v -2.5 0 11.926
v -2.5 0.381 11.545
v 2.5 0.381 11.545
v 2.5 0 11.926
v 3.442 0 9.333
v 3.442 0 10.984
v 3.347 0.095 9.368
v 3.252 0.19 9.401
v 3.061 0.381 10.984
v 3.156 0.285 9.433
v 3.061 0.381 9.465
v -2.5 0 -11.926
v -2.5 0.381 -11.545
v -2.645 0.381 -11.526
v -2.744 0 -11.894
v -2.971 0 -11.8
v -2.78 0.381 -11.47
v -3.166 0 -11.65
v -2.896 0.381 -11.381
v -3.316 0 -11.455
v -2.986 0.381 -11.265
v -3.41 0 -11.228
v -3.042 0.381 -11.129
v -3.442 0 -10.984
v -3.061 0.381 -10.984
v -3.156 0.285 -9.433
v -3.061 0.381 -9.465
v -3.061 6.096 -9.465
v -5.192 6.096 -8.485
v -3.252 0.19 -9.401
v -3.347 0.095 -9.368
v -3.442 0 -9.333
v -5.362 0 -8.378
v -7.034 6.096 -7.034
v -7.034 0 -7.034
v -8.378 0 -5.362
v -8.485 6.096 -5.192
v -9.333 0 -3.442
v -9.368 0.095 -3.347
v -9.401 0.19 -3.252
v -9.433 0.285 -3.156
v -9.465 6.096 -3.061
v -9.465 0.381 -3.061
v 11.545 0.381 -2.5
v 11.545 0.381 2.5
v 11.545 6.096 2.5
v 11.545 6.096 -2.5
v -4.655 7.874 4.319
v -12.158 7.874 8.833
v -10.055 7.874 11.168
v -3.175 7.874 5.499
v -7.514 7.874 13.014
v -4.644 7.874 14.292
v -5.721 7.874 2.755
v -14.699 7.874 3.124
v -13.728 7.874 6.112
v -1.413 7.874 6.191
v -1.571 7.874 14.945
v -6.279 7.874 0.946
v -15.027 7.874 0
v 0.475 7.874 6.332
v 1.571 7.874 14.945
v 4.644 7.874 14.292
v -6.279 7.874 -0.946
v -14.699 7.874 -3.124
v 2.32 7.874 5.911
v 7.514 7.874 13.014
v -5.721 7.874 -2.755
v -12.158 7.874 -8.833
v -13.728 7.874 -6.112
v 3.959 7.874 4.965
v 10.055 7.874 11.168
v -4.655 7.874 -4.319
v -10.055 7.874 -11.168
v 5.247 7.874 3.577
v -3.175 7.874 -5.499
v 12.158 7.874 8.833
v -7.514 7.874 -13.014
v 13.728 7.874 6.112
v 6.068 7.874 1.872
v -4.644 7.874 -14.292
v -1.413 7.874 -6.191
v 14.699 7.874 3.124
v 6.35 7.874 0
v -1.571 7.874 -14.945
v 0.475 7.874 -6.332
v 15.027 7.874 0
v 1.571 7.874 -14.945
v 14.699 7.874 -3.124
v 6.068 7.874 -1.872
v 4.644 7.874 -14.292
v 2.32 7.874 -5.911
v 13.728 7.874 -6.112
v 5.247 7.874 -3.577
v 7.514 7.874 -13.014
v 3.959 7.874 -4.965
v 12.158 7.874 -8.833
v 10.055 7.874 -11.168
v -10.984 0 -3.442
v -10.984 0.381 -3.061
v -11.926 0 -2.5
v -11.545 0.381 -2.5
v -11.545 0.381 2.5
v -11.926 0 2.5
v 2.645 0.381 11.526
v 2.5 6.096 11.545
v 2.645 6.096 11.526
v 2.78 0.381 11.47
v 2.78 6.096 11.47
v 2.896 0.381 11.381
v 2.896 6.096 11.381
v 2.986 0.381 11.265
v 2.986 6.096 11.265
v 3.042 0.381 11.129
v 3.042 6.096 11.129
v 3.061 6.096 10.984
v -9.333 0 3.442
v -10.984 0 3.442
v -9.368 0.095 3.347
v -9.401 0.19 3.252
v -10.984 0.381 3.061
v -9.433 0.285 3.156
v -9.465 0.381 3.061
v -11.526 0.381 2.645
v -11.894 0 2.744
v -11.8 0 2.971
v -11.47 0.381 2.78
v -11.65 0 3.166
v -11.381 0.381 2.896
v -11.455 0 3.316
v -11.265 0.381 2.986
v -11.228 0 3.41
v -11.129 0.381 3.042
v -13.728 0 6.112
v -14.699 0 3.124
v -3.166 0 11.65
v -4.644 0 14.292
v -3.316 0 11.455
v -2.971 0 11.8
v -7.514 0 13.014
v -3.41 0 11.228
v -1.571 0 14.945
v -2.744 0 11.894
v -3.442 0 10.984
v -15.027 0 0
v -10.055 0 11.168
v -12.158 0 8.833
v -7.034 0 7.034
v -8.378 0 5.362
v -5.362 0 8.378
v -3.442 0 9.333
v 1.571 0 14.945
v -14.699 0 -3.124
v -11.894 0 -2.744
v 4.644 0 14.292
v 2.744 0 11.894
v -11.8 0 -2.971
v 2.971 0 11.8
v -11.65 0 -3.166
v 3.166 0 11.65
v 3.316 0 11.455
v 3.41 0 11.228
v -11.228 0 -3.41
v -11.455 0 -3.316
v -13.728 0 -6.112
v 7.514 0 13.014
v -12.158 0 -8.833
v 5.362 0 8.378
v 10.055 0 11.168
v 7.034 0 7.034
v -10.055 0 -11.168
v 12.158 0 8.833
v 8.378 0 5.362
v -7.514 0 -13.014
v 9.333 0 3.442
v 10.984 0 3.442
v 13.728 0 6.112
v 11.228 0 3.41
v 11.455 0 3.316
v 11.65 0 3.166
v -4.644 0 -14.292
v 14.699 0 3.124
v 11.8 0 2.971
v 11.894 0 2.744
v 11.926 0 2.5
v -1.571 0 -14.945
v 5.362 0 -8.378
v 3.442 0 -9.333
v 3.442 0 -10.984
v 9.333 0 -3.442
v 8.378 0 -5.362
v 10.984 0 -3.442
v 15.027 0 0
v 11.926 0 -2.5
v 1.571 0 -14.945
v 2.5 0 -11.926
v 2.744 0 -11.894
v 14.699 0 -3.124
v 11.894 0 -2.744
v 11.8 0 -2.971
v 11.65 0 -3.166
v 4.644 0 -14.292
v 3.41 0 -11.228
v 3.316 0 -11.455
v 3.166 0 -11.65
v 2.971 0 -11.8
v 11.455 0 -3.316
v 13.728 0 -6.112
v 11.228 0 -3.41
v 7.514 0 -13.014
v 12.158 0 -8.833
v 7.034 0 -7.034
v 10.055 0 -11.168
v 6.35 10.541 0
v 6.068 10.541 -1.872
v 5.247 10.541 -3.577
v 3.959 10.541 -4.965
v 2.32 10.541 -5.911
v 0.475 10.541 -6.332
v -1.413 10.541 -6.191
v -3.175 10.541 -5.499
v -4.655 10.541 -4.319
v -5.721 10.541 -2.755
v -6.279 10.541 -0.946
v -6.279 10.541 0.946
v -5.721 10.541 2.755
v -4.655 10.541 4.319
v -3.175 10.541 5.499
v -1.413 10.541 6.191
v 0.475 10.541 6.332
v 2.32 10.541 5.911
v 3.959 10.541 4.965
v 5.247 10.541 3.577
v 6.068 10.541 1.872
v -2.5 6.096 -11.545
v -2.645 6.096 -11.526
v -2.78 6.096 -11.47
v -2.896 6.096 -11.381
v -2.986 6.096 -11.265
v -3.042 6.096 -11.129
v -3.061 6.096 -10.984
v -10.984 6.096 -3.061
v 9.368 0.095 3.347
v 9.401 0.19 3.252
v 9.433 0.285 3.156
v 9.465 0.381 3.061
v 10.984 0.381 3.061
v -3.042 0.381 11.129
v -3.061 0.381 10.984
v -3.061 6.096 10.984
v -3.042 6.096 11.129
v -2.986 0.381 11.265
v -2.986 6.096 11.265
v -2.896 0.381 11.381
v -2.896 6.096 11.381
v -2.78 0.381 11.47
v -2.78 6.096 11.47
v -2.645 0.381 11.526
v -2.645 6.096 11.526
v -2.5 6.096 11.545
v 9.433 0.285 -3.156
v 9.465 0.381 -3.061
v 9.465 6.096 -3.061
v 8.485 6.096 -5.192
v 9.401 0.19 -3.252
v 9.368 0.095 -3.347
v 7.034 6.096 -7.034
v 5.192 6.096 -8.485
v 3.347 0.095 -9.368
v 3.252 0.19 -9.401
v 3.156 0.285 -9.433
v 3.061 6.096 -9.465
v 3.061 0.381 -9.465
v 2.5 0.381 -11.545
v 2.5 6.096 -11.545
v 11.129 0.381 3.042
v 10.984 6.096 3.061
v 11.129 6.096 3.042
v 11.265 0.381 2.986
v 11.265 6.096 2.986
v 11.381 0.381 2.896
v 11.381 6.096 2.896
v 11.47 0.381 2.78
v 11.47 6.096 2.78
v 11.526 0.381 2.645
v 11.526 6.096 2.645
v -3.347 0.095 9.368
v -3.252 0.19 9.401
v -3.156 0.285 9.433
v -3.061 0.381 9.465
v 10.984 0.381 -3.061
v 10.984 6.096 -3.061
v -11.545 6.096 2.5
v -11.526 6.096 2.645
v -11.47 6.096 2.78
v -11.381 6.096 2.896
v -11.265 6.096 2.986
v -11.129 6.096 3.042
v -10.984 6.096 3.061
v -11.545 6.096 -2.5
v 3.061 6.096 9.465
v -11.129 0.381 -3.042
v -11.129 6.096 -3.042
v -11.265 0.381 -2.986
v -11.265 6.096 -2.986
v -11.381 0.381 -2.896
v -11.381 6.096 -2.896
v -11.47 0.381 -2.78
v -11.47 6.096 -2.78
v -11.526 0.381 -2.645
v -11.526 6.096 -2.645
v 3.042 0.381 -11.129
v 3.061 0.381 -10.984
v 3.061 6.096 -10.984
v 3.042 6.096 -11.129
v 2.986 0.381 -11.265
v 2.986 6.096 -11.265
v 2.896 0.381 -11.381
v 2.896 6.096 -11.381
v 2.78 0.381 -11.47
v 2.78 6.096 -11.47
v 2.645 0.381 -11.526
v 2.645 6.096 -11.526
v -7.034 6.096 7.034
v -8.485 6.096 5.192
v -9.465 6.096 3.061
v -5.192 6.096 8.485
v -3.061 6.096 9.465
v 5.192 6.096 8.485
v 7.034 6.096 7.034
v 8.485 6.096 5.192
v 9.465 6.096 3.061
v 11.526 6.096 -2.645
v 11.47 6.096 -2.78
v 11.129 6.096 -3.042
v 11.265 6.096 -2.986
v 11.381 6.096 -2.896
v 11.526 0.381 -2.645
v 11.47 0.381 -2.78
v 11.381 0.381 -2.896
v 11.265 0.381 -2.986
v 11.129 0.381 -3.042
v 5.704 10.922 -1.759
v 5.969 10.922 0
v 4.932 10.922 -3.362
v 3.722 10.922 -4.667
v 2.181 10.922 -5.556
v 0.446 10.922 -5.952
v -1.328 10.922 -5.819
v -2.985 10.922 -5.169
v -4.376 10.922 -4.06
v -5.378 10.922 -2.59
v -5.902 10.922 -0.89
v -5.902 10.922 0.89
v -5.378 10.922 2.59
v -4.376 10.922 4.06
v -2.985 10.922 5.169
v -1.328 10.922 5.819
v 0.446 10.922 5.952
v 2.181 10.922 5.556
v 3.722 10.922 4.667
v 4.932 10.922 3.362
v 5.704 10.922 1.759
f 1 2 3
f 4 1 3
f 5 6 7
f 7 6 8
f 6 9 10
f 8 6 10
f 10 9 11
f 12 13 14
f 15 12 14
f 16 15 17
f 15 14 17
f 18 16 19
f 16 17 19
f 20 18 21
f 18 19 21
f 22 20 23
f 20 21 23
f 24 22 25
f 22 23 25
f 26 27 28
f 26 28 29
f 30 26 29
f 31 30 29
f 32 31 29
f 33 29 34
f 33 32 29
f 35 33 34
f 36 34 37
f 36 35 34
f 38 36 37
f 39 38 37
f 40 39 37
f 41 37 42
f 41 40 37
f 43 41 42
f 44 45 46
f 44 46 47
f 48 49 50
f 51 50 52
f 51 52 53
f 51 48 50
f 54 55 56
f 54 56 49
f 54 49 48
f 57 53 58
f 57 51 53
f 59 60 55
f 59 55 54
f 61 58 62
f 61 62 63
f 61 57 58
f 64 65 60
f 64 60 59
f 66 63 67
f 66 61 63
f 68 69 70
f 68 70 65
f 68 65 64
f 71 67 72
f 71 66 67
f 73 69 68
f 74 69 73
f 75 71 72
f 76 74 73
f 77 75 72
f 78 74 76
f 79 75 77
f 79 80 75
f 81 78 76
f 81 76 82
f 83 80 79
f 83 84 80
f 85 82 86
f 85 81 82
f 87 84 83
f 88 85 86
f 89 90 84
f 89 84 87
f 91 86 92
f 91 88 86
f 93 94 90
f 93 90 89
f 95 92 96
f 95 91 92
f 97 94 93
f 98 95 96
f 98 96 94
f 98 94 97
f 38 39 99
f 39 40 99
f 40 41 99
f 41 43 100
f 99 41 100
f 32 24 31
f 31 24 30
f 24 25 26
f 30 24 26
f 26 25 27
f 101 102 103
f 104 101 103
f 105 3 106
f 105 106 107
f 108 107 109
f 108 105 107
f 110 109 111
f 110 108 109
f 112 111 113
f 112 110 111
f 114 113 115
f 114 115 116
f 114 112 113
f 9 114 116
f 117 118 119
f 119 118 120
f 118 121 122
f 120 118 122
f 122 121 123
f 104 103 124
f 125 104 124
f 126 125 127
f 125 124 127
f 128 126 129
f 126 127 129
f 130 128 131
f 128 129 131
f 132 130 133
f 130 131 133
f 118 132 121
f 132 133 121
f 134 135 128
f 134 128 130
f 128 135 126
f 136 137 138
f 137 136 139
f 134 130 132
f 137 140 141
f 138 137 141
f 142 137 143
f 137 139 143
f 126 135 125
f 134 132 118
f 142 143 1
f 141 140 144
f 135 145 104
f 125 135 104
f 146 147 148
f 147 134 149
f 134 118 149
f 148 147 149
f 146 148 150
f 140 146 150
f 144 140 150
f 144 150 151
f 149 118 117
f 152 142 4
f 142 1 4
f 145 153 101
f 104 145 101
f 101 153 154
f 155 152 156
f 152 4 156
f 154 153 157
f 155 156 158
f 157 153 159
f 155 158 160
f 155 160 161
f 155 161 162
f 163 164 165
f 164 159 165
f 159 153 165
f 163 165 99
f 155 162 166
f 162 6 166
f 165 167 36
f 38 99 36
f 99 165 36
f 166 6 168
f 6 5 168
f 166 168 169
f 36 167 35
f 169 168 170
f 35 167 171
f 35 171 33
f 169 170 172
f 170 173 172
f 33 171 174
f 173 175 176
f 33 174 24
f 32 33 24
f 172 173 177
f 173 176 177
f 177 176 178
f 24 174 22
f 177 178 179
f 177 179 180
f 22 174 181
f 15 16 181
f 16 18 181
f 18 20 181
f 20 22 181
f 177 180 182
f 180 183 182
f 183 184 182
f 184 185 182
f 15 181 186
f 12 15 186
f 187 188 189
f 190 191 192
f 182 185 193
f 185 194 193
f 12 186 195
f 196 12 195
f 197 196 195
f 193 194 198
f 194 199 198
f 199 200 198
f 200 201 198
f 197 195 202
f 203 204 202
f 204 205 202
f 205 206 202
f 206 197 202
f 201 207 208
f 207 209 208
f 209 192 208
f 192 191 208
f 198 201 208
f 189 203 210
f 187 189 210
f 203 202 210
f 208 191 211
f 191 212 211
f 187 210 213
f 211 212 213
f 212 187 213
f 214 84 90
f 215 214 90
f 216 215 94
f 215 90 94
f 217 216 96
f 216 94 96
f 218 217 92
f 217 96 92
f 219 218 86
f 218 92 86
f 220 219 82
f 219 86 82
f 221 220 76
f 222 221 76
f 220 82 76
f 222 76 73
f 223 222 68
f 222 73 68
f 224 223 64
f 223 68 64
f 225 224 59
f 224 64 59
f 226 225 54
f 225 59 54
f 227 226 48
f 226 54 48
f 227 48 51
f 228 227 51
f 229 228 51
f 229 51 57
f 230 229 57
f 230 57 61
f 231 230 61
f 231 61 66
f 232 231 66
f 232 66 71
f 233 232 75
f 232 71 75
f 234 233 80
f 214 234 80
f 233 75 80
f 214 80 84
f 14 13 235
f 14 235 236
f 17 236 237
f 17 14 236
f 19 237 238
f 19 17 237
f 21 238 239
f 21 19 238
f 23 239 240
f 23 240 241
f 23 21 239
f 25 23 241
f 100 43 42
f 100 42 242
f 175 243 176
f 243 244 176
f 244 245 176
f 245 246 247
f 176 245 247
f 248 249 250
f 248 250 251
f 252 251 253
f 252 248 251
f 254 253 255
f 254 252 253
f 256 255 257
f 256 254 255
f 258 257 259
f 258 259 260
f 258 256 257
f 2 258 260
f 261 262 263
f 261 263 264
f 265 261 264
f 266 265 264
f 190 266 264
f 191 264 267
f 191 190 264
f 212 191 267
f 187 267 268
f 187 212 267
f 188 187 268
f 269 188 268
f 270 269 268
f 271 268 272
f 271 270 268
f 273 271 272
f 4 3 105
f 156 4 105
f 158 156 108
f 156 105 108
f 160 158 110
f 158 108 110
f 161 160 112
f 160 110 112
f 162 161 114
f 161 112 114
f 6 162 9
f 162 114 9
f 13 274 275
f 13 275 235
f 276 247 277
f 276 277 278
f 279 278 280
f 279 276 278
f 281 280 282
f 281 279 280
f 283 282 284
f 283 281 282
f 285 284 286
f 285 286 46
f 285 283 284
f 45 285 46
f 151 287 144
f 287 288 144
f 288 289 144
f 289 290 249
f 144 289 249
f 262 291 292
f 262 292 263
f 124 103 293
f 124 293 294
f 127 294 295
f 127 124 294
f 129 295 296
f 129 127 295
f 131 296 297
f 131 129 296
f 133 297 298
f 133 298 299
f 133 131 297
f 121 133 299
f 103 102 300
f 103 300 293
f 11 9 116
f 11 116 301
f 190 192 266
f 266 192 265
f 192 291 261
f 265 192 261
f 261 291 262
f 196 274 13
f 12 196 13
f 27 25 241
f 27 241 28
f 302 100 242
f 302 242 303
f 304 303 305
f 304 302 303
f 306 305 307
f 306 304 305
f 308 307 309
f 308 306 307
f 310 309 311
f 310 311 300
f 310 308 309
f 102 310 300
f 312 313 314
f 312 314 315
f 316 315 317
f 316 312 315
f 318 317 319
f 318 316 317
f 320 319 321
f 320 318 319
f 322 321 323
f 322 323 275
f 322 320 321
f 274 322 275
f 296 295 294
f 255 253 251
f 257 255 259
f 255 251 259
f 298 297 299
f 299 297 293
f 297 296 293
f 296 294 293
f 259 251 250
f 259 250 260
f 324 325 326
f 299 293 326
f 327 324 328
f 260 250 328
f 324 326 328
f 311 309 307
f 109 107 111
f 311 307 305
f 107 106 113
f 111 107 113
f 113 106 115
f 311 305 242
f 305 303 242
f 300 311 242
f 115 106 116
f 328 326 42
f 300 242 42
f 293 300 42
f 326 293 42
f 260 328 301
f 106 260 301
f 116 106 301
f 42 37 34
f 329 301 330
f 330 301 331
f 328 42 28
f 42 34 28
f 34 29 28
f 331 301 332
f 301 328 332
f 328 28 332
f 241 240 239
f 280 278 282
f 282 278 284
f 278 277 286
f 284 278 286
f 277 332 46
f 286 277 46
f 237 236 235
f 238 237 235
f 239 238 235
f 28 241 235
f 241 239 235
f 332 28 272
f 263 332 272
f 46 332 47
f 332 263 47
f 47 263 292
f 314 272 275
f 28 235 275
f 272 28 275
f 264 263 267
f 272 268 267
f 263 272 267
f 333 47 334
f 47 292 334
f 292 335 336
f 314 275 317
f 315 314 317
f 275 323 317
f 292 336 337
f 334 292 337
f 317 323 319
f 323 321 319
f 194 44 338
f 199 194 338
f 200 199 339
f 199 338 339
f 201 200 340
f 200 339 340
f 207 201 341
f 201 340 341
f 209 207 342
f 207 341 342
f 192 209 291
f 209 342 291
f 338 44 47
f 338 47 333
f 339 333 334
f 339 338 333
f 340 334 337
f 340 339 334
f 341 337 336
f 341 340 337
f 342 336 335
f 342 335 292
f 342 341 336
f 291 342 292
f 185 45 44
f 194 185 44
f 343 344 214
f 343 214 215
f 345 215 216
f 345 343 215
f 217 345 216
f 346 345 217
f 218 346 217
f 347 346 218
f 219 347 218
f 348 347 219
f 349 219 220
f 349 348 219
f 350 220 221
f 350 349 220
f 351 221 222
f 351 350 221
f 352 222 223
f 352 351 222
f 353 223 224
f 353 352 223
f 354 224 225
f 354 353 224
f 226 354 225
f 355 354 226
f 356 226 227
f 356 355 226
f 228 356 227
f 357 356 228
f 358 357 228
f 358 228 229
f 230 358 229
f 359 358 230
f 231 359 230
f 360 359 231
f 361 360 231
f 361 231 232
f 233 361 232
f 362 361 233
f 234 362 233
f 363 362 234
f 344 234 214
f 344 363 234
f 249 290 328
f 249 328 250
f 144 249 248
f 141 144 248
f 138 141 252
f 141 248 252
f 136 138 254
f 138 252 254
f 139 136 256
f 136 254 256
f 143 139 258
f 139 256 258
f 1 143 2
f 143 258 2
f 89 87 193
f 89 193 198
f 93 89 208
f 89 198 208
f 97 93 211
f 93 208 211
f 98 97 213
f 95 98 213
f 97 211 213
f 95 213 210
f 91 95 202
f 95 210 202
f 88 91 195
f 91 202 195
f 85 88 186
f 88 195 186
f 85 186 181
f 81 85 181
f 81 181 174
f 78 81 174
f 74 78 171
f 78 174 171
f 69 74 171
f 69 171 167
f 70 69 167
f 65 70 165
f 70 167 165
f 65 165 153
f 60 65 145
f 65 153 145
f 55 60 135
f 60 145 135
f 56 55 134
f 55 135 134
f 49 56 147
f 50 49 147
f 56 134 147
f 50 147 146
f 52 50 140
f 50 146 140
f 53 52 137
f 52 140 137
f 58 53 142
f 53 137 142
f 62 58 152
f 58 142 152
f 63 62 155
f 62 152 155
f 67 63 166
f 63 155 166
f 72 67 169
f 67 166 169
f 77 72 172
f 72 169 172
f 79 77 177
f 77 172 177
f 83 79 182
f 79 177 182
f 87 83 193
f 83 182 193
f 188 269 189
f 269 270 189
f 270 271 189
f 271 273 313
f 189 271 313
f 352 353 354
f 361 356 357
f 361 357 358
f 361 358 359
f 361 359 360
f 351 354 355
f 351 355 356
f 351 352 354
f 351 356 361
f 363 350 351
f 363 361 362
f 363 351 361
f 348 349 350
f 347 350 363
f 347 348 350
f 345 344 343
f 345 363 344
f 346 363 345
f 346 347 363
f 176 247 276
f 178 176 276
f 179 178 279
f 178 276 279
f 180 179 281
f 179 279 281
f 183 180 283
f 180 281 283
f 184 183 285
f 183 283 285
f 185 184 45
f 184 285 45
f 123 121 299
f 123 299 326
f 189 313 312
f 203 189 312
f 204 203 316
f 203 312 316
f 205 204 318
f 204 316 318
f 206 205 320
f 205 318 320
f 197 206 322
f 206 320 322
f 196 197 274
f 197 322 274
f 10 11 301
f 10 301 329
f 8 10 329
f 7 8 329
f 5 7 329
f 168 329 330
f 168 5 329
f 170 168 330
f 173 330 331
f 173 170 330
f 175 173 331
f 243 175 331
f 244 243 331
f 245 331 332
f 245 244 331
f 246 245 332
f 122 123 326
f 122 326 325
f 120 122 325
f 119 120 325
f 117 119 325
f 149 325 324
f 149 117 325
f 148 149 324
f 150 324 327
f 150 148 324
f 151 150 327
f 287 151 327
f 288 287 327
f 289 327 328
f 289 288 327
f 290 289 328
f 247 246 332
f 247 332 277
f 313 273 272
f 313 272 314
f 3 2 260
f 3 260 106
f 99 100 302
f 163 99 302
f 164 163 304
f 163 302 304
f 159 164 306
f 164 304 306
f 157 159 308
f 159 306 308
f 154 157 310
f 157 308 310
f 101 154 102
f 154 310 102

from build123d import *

# Parameters (mm, degrees)
SKETCH1_R           = 15.027499291
BOSS_EXTRUDE1_DEPTH = 6.096
SKETCH2_R           = 15.027499291
BOSS_EXTRUDE2_DEPTH = 1.778
CHAMFER1_SIZE       = 0.381
SKETCH3_R           = 6.35
BOSS_EXTRUDE3_DEPTH = 3.048
CHAMFER2_SIZE       = 0.381


with BuildPart() as part:
    # Sketch1 → Boss-Extrude1 (new body)
    with BuildSketch(Plane(origin=(0, 0, 0), x_dir=(1, 0, 0), z_dir=(0, 1, 0))):
        Circle(SKETCH1_R)
        with BuildLine():
            ThreePointArc((-9.464927768, 3.0607), (-7.033944205, 7.033944205), (-3.0607, 9.464927768))
            Line((-3.0607, 9.464927768), (-3.0607, 10.984341946))
            ThreePointArc((-3.0607, 10.984341946), (-2.896474772, 11.380816718), (-2.5, 11.545041946))
            Line((-2.5, 11.545041946), (2.5, 11.545041946))
            ThreePointArc((2.5, 11.545041946), (2.896474772, 11.380816718), (3.0607, 10.984341946))
            Line((3.0607, 10.984341946), (3.0607, 9.464927768))
            ThreePointArc((3.0607, 9.464927768), (7.033944205, 7.033944205), (9.464927768, 3.0607))
            Line((9.464927768, 3.0607), (10.984341946, 3.0607))
            ThreePointArc((10.984341946, 3.0607), (11.380816718, 2.896474772), (11.545041946, 2.5))
            Line((11.545041946, 2.5), (11.545041946, -2.5))
            ThreePointArc((11.545041946, -2.5), (11.380816718, -2.896474772), (10.984341946, -3.0607))
            Line((10.984341946, -3.0607), (9.464927768, -3.0607))
            ThreePointArc((9.464927768, -3.0607), (7.033944205, -7.033944205), (3.0607, -9.464927768))
            Line((3.0607, -9.464927768), (3.0607, -10.984341946))
            ThreePointArc((3.0607, -10.984341946), (2.896474772, -11.380816718), (2.5, -11.545041946))
            Line((2.5, -11.545041946), (-2.5, -11.545041946))
            ThreePointArc((-2.5, -11.545041946), (-2.896474772, -11.380816718), (-3.0607, -10.984341946))
            Line((-3.0607, -10.984341946), (-3.0607, -9.464927768))
            ThreePointArc((-3.0607, -9.464927768), (-7.033944205, -7.033944205), (-9.464927768, -3.0607))
            Line((-9.464927768, -3.0607), (-10.984341946, -3.0607))
            ThreePointArc((-10.984341946, -3.0607), (-11.380816718, -2.896474772), (-11.545041946, -2.5))
            Line((-11.545041946, -2.5), (-11.545041946, 2.5))
            ThreePointArc((-11.545041946, 2.5), (-11.380816718, 2.896474772), (-10.984341946, 3.0607))
            Line((-10.984341946, 3.0607), (-9.464927768, 3.0607))
        make_face(mode=Mode.SUBTRACT)
    extrude(amount=BOSS_EXTRUDE1_DEPTH)

    # Sketch2 → Boss-Extrude2 (add)
    with BuildSketch(Plane(origin=(0, 6.096, 0), x_dir=(1, 0, 0), z_dir=(0, 1, 0))):
        Circle(SKETCH2_R)
    extrude(amount=BOSS_EXTRUDE2_DEPTH)

    # Chamfer1
    chamfer1_edges = [part.edges().sort_by_distance(p)[0] for p in [
        (3.0607, 0, 10.224634857),
        (-3.0607, 0, 10.224634857),
        (2.896474772, 0, 11.380816718),
        (-2.896474772, 0, 11.380816718),
        (0, 0, 11.545041946),
        (-10.224634857, 0, 3.0607),
        (-10.224634857, 0, -3.0607),
        (-11.380816718, 0, 2.896474772),
        (-11.380816718, 0, -2.896474772),
        (-11.545041946, 0, 0),
        (-3.0607, 0, -10.224634857),
        (3.0607, 0, -10.224634857),
        (-2.896474772, 0, -11.380816718),
        (2.896474772, 0, -11.380816718),
        (0, 0, -11.545041946),
        (10.224634857, 0, -3.0607),
        (10.224634857, 0, 3.0607),
        (11.380816718, 0, -2.896474772),
        (11.380816718, 0, 2.896474772),
        (11.545041946, 0, 0),
    ]]
    chamfer(chamfer1_edges, length=CHAMFER1_SIZE)

    # Sketch3 → Boss-Extrude3 (add)
    with BuildSketch(Plane(origin=(0, 7.874, 0), x_dir=(1, 0, 0), z_dir=(0, 1, 0))):
        Circle(SKETCH3_R)
    extrude(amount=BOSS_EXTRUDE3_DEPTH)

    # Chamfer2
    chamfer2_edges = [part.edges().sort_by_distance(p)[0] for p in [
        (-6.35, 10.922, 0),
    ]]
    chamfer(chamfer2_edges, length=CHAMFER2_SIZE)


solid = part.part
